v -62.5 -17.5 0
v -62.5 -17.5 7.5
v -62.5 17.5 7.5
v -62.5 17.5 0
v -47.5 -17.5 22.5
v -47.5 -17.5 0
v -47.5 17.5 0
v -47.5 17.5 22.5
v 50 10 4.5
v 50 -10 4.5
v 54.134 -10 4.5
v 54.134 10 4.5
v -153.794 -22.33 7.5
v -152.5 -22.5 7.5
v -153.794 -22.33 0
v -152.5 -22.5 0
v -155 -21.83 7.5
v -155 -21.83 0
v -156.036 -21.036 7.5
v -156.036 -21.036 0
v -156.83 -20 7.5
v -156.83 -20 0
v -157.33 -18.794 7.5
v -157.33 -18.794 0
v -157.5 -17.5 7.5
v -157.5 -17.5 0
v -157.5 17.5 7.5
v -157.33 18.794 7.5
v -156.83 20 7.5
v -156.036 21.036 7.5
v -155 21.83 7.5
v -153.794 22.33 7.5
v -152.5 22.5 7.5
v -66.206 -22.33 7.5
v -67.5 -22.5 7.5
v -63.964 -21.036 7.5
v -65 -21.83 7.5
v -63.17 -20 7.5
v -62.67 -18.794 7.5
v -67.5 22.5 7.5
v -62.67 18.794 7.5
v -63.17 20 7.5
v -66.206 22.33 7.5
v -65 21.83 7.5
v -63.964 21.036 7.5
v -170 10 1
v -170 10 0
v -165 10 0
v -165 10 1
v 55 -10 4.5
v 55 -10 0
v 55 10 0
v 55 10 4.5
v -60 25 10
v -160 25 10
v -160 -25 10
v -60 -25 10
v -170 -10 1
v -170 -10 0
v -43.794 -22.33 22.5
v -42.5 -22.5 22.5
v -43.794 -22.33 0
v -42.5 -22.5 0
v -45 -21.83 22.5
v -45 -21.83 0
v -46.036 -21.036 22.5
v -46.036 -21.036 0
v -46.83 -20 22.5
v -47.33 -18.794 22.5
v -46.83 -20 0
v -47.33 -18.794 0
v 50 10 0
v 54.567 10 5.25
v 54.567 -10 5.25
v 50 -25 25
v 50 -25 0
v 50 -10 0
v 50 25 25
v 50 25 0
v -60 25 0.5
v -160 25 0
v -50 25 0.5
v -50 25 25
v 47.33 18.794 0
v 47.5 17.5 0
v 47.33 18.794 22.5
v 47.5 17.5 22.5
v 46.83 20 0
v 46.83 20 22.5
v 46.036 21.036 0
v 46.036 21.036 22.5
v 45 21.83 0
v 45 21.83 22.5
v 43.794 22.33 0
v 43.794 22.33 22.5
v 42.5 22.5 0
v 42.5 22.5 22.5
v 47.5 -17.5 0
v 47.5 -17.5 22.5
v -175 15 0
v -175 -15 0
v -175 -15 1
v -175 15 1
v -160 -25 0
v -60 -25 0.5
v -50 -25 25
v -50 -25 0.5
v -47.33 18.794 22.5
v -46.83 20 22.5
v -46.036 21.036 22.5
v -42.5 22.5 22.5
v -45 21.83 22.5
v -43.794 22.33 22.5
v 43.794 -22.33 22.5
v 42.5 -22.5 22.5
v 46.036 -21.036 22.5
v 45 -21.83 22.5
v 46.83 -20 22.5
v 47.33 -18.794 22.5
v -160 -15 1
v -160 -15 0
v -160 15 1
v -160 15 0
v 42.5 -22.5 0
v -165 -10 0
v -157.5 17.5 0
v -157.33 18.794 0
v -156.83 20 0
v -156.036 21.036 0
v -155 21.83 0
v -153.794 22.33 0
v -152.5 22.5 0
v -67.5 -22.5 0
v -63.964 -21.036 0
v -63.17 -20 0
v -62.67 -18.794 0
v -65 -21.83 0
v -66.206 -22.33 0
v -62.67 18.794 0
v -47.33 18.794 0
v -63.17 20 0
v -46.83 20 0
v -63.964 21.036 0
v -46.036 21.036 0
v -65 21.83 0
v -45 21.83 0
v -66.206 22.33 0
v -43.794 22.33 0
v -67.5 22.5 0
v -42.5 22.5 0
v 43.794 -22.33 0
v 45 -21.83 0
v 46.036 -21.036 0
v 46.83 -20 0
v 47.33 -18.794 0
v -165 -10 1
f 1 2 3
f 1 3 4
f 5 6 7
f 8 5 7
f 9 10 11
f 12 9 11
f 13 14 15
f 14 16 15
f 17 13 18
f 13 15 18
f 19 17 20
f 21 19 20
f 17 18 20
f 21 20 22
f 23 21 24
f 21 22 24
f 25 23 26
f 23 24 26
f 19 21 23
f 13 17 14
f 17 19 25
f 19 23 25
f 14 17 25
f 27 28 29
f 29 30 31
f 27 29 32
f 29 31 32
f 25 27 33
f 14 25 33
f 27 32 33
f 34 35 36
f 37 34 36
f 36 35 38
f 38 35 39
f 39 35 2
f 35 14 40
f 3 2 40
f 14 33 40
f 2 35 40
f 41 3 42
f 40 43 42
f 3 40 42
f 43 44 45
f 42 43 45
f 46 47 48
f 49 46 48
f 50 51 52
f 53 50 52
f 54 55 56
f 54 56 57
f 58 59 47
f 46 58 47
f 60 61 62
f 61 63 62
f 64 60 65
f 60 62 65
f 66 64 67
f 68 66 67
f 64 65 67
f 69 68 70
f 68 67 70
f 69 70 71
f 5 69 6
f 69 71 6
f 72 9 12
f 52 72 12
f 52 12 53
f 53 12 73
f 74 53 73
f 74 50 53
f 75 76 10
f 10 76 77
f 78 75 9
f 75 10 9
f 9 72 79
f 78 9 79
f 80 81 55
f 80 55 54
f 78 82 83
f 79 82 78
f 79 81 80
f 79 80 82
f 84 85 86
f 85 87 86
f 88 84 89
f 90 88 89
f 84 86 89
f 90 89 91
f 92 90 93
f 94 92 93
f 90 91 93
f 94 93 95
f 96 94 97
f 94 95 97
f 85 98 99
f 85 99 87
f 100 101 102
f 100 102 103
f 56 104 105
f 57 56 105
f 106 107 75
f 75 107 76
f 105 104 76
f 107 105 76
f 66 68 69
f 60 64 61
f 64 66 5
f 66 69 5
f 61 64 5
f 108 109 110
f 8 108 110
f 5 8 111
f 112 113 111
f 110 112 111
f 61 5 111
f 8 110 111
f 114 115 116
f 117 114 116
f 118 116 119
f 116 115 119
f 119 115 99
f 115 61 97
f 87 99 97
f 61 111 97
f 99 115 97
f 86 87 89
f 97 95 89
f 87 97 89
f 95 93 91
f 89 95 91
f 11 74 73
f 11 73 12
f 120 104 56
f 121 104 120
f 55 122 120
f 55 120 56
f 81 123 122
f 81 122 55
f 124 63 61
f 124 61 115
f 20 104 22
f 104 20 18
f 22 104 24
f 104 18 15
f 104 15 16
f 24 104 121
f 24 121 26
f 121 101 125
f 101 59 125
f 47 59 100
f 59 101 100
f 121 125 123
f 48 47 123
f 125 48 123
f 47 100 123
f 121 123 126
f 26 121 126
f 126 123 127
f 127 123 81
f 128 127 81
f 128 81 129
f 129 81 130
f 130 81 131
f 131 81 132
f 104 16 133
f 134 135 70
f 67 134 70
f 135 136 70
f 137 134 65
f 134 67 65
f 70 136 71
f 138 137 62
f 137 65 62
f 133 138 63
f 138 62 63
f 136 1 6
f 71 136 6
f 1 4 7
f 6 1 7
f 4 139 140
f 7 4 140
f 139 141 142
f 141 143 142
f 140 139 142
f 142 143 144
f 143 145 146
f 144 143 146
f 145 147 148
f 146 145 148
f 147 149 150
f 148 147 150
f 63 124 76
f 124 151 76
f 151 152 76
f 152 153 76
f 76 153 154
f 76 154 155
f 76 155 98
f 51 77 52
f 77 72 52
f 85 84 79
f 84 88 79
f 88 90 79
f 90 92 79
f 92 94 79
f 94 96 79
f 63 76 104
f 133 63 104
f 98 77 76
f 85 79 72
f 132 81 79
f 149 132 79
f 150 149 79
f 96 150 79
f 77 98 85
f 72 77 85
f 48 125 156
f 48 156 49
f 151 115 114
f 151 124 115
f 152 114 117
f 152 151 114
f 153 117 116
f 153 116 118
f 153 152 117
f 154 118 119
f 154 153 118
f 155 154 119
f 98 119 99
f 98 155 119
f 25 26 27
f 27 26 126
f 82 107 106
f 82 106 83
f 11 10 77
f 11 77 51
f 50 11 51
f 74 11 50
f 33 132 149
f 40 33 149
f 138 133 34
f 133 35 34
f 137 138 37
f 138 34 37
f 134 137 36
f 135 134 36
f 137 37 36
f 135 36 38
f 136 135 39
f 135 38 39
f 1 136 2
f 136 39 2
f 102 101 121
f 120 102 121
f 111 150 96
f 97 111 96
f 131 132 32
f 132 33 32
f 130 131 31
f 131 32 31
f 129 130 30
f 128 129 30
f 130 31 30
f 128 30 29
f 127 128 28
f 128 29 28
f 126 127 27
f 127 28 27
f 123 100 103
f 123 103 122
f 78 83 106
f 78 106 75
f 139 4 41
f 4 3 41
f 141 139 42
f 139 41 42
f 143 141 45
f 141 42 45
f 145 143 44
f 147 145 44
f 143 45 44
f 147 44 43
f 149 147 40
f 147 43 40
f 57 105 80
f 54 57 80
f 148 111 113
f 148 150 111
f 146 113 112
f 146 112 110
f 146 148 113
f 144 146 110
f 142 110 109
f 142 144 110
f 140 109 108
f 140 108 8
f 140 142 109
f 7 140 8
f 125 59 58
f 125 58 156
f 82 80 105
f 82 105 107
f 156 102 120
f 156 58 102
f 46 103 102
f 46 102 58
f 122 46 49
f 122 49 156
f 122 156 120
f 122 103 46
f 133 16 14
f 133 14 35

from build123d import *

# Parameters (mm, degrees)
F0_W        = 100
F0_H        = 50
F1_DEPTH    = 25
F2_W        = 10
F2_H        = 50
F3_DEPTH    = 0.5
F4_W        = 100
F4_H        = 50
F5_DEPTH    = 10
F6_T        = 2.5
F6_T3_DEPTH = 55
F7_R        = 5
F8_W        = 5
F8_H        = 20
F9_DEPTH    = 4.5
F10_W       = 15
F10_H       = 30
F10_W_2     = 5
F10_H_2     = 20
F11_DEPTH   = 1
F13_DEPTH   = 10


# Not quite as in the source:
# - a shell that OpenCascade refuses in one call is made with other operations: the cavity is built on its own and cut out


with BuildPart() as f1:
    # F0 (on Top) → F1 (new body)
    with BuildSketch(Plane.XY):
        Rectangle(F0_W, F0_H)
    extrude(amount=F1_DEPTH)

    # F2 (on Top) → F3 (join)
    with BuildSketch(Plane.XY):
        with Locations((-55, 0)):
            Rectangle(F2_W, F2_H)
    extrude(amount=F3_DEPTH)

    # F4 (on Top) → F5 (join)
    with BuildSketch(Plane.XY):
        with Locations((-110, 0)):
            Rectangle(F4_W, F4_H)
    extrude(amount=F5_DEPTH)

    # F6: shell of thickness 2.5, made by hand


with BuildPart() as f6_core1:
    # F6_t2: copy of F1
    add(f1.part)

    # the walls: a layer under each face that stays
    f6_faces = [f6_core1.faces().sort_by_distance(p)[0] for p in [
        (-50, 0, 12.75),
        (15, 25, 20.8333333333),
        (-160, 0, 5),
        (-110, 0, 10),
        (-60, 0, 5.25),
        (50, 0, 12.5),
        (0, 0, 25),
        (-125, -25, 4.1666666667),
        (-55, 0, 0.5),
    ]]
    thicken(f6_faces, amount=-F6_T, mode=Mode.SUBTRACT)

    # F6_s4 → F6_t3 (cut)
    with BuildSketch(Plane.XZ.offset(-27.5)):
        Polygon((-50.025, 0.525), (-47.5, 0.5), (-47.5, -2), (-50, -2), align=None)
        Polygon((-59.975, 0.525), (-62.5, 0.5), (-62.5, -2), (-60, -2), align=None)
    extrude(amount=F6_T3_DEPTH, mode=Mode.SUBTRACT)


with BuildPart() as f1_1:
    add(f1.part)

    # what is left inside the walls is the cavity
    f6_cavity = [f6_core1.part.solids().sort_by_distance(p)[0] for p in [
        (0, -7.5, 22.475),
        (-110, -7.5, 7.475),
    ]]
    add(f6_cavity, mode=Mode.SUBTRACT)

    # F7
    f7_edges = [f1_1.edges().sort_by_distance(p)[0] for p in [
        (-157.5, -22.5, 3.75),
        (-62.5, -22.5, 3.75),
        (-62.5, 22.5, 3.75),
        (-157.5, 22.5, 3.75),
        (-47.5, -22.5, 11.25),
        (47.5, -22.5, 11.25),
        (47.5, 22.5, 11.25),
        (-47.5, 22.5, 11.25),
    ]]
    fillet(f7_edges, radius=F7_R)

    # F8 (on Top) → F9 (join)
    with BuildSketch(Plane.XY):
        with Locations((52.5, 0)):
            Rectangle(F8_W, F8_H)
    extrude(amount=F9_DEPTH)

    # F10 (on Top) → F11 (join)
    with BuildSketch(Plane.XY):
        with Locations((-167.5, 0)):
            Rectangle(F10_W, F10_H)
        with Locations((-167.5, 0)):
            Rectangle(F10_W_2, F10_H_2, mode=Mode.SUBTRACT)
    extrude(amount=F11_DEPTH)

    # F12 (on Front) → F13 (join, symmetric)
    with BuildSketch(Plane.XZ):
        Polygon((55, 4.5), (54.5669872981, 5.25), (54.1339745962, 4.5), align=None)
    extrude(amount=F13_DEPTH, both=True)


solid = f1_1.part
